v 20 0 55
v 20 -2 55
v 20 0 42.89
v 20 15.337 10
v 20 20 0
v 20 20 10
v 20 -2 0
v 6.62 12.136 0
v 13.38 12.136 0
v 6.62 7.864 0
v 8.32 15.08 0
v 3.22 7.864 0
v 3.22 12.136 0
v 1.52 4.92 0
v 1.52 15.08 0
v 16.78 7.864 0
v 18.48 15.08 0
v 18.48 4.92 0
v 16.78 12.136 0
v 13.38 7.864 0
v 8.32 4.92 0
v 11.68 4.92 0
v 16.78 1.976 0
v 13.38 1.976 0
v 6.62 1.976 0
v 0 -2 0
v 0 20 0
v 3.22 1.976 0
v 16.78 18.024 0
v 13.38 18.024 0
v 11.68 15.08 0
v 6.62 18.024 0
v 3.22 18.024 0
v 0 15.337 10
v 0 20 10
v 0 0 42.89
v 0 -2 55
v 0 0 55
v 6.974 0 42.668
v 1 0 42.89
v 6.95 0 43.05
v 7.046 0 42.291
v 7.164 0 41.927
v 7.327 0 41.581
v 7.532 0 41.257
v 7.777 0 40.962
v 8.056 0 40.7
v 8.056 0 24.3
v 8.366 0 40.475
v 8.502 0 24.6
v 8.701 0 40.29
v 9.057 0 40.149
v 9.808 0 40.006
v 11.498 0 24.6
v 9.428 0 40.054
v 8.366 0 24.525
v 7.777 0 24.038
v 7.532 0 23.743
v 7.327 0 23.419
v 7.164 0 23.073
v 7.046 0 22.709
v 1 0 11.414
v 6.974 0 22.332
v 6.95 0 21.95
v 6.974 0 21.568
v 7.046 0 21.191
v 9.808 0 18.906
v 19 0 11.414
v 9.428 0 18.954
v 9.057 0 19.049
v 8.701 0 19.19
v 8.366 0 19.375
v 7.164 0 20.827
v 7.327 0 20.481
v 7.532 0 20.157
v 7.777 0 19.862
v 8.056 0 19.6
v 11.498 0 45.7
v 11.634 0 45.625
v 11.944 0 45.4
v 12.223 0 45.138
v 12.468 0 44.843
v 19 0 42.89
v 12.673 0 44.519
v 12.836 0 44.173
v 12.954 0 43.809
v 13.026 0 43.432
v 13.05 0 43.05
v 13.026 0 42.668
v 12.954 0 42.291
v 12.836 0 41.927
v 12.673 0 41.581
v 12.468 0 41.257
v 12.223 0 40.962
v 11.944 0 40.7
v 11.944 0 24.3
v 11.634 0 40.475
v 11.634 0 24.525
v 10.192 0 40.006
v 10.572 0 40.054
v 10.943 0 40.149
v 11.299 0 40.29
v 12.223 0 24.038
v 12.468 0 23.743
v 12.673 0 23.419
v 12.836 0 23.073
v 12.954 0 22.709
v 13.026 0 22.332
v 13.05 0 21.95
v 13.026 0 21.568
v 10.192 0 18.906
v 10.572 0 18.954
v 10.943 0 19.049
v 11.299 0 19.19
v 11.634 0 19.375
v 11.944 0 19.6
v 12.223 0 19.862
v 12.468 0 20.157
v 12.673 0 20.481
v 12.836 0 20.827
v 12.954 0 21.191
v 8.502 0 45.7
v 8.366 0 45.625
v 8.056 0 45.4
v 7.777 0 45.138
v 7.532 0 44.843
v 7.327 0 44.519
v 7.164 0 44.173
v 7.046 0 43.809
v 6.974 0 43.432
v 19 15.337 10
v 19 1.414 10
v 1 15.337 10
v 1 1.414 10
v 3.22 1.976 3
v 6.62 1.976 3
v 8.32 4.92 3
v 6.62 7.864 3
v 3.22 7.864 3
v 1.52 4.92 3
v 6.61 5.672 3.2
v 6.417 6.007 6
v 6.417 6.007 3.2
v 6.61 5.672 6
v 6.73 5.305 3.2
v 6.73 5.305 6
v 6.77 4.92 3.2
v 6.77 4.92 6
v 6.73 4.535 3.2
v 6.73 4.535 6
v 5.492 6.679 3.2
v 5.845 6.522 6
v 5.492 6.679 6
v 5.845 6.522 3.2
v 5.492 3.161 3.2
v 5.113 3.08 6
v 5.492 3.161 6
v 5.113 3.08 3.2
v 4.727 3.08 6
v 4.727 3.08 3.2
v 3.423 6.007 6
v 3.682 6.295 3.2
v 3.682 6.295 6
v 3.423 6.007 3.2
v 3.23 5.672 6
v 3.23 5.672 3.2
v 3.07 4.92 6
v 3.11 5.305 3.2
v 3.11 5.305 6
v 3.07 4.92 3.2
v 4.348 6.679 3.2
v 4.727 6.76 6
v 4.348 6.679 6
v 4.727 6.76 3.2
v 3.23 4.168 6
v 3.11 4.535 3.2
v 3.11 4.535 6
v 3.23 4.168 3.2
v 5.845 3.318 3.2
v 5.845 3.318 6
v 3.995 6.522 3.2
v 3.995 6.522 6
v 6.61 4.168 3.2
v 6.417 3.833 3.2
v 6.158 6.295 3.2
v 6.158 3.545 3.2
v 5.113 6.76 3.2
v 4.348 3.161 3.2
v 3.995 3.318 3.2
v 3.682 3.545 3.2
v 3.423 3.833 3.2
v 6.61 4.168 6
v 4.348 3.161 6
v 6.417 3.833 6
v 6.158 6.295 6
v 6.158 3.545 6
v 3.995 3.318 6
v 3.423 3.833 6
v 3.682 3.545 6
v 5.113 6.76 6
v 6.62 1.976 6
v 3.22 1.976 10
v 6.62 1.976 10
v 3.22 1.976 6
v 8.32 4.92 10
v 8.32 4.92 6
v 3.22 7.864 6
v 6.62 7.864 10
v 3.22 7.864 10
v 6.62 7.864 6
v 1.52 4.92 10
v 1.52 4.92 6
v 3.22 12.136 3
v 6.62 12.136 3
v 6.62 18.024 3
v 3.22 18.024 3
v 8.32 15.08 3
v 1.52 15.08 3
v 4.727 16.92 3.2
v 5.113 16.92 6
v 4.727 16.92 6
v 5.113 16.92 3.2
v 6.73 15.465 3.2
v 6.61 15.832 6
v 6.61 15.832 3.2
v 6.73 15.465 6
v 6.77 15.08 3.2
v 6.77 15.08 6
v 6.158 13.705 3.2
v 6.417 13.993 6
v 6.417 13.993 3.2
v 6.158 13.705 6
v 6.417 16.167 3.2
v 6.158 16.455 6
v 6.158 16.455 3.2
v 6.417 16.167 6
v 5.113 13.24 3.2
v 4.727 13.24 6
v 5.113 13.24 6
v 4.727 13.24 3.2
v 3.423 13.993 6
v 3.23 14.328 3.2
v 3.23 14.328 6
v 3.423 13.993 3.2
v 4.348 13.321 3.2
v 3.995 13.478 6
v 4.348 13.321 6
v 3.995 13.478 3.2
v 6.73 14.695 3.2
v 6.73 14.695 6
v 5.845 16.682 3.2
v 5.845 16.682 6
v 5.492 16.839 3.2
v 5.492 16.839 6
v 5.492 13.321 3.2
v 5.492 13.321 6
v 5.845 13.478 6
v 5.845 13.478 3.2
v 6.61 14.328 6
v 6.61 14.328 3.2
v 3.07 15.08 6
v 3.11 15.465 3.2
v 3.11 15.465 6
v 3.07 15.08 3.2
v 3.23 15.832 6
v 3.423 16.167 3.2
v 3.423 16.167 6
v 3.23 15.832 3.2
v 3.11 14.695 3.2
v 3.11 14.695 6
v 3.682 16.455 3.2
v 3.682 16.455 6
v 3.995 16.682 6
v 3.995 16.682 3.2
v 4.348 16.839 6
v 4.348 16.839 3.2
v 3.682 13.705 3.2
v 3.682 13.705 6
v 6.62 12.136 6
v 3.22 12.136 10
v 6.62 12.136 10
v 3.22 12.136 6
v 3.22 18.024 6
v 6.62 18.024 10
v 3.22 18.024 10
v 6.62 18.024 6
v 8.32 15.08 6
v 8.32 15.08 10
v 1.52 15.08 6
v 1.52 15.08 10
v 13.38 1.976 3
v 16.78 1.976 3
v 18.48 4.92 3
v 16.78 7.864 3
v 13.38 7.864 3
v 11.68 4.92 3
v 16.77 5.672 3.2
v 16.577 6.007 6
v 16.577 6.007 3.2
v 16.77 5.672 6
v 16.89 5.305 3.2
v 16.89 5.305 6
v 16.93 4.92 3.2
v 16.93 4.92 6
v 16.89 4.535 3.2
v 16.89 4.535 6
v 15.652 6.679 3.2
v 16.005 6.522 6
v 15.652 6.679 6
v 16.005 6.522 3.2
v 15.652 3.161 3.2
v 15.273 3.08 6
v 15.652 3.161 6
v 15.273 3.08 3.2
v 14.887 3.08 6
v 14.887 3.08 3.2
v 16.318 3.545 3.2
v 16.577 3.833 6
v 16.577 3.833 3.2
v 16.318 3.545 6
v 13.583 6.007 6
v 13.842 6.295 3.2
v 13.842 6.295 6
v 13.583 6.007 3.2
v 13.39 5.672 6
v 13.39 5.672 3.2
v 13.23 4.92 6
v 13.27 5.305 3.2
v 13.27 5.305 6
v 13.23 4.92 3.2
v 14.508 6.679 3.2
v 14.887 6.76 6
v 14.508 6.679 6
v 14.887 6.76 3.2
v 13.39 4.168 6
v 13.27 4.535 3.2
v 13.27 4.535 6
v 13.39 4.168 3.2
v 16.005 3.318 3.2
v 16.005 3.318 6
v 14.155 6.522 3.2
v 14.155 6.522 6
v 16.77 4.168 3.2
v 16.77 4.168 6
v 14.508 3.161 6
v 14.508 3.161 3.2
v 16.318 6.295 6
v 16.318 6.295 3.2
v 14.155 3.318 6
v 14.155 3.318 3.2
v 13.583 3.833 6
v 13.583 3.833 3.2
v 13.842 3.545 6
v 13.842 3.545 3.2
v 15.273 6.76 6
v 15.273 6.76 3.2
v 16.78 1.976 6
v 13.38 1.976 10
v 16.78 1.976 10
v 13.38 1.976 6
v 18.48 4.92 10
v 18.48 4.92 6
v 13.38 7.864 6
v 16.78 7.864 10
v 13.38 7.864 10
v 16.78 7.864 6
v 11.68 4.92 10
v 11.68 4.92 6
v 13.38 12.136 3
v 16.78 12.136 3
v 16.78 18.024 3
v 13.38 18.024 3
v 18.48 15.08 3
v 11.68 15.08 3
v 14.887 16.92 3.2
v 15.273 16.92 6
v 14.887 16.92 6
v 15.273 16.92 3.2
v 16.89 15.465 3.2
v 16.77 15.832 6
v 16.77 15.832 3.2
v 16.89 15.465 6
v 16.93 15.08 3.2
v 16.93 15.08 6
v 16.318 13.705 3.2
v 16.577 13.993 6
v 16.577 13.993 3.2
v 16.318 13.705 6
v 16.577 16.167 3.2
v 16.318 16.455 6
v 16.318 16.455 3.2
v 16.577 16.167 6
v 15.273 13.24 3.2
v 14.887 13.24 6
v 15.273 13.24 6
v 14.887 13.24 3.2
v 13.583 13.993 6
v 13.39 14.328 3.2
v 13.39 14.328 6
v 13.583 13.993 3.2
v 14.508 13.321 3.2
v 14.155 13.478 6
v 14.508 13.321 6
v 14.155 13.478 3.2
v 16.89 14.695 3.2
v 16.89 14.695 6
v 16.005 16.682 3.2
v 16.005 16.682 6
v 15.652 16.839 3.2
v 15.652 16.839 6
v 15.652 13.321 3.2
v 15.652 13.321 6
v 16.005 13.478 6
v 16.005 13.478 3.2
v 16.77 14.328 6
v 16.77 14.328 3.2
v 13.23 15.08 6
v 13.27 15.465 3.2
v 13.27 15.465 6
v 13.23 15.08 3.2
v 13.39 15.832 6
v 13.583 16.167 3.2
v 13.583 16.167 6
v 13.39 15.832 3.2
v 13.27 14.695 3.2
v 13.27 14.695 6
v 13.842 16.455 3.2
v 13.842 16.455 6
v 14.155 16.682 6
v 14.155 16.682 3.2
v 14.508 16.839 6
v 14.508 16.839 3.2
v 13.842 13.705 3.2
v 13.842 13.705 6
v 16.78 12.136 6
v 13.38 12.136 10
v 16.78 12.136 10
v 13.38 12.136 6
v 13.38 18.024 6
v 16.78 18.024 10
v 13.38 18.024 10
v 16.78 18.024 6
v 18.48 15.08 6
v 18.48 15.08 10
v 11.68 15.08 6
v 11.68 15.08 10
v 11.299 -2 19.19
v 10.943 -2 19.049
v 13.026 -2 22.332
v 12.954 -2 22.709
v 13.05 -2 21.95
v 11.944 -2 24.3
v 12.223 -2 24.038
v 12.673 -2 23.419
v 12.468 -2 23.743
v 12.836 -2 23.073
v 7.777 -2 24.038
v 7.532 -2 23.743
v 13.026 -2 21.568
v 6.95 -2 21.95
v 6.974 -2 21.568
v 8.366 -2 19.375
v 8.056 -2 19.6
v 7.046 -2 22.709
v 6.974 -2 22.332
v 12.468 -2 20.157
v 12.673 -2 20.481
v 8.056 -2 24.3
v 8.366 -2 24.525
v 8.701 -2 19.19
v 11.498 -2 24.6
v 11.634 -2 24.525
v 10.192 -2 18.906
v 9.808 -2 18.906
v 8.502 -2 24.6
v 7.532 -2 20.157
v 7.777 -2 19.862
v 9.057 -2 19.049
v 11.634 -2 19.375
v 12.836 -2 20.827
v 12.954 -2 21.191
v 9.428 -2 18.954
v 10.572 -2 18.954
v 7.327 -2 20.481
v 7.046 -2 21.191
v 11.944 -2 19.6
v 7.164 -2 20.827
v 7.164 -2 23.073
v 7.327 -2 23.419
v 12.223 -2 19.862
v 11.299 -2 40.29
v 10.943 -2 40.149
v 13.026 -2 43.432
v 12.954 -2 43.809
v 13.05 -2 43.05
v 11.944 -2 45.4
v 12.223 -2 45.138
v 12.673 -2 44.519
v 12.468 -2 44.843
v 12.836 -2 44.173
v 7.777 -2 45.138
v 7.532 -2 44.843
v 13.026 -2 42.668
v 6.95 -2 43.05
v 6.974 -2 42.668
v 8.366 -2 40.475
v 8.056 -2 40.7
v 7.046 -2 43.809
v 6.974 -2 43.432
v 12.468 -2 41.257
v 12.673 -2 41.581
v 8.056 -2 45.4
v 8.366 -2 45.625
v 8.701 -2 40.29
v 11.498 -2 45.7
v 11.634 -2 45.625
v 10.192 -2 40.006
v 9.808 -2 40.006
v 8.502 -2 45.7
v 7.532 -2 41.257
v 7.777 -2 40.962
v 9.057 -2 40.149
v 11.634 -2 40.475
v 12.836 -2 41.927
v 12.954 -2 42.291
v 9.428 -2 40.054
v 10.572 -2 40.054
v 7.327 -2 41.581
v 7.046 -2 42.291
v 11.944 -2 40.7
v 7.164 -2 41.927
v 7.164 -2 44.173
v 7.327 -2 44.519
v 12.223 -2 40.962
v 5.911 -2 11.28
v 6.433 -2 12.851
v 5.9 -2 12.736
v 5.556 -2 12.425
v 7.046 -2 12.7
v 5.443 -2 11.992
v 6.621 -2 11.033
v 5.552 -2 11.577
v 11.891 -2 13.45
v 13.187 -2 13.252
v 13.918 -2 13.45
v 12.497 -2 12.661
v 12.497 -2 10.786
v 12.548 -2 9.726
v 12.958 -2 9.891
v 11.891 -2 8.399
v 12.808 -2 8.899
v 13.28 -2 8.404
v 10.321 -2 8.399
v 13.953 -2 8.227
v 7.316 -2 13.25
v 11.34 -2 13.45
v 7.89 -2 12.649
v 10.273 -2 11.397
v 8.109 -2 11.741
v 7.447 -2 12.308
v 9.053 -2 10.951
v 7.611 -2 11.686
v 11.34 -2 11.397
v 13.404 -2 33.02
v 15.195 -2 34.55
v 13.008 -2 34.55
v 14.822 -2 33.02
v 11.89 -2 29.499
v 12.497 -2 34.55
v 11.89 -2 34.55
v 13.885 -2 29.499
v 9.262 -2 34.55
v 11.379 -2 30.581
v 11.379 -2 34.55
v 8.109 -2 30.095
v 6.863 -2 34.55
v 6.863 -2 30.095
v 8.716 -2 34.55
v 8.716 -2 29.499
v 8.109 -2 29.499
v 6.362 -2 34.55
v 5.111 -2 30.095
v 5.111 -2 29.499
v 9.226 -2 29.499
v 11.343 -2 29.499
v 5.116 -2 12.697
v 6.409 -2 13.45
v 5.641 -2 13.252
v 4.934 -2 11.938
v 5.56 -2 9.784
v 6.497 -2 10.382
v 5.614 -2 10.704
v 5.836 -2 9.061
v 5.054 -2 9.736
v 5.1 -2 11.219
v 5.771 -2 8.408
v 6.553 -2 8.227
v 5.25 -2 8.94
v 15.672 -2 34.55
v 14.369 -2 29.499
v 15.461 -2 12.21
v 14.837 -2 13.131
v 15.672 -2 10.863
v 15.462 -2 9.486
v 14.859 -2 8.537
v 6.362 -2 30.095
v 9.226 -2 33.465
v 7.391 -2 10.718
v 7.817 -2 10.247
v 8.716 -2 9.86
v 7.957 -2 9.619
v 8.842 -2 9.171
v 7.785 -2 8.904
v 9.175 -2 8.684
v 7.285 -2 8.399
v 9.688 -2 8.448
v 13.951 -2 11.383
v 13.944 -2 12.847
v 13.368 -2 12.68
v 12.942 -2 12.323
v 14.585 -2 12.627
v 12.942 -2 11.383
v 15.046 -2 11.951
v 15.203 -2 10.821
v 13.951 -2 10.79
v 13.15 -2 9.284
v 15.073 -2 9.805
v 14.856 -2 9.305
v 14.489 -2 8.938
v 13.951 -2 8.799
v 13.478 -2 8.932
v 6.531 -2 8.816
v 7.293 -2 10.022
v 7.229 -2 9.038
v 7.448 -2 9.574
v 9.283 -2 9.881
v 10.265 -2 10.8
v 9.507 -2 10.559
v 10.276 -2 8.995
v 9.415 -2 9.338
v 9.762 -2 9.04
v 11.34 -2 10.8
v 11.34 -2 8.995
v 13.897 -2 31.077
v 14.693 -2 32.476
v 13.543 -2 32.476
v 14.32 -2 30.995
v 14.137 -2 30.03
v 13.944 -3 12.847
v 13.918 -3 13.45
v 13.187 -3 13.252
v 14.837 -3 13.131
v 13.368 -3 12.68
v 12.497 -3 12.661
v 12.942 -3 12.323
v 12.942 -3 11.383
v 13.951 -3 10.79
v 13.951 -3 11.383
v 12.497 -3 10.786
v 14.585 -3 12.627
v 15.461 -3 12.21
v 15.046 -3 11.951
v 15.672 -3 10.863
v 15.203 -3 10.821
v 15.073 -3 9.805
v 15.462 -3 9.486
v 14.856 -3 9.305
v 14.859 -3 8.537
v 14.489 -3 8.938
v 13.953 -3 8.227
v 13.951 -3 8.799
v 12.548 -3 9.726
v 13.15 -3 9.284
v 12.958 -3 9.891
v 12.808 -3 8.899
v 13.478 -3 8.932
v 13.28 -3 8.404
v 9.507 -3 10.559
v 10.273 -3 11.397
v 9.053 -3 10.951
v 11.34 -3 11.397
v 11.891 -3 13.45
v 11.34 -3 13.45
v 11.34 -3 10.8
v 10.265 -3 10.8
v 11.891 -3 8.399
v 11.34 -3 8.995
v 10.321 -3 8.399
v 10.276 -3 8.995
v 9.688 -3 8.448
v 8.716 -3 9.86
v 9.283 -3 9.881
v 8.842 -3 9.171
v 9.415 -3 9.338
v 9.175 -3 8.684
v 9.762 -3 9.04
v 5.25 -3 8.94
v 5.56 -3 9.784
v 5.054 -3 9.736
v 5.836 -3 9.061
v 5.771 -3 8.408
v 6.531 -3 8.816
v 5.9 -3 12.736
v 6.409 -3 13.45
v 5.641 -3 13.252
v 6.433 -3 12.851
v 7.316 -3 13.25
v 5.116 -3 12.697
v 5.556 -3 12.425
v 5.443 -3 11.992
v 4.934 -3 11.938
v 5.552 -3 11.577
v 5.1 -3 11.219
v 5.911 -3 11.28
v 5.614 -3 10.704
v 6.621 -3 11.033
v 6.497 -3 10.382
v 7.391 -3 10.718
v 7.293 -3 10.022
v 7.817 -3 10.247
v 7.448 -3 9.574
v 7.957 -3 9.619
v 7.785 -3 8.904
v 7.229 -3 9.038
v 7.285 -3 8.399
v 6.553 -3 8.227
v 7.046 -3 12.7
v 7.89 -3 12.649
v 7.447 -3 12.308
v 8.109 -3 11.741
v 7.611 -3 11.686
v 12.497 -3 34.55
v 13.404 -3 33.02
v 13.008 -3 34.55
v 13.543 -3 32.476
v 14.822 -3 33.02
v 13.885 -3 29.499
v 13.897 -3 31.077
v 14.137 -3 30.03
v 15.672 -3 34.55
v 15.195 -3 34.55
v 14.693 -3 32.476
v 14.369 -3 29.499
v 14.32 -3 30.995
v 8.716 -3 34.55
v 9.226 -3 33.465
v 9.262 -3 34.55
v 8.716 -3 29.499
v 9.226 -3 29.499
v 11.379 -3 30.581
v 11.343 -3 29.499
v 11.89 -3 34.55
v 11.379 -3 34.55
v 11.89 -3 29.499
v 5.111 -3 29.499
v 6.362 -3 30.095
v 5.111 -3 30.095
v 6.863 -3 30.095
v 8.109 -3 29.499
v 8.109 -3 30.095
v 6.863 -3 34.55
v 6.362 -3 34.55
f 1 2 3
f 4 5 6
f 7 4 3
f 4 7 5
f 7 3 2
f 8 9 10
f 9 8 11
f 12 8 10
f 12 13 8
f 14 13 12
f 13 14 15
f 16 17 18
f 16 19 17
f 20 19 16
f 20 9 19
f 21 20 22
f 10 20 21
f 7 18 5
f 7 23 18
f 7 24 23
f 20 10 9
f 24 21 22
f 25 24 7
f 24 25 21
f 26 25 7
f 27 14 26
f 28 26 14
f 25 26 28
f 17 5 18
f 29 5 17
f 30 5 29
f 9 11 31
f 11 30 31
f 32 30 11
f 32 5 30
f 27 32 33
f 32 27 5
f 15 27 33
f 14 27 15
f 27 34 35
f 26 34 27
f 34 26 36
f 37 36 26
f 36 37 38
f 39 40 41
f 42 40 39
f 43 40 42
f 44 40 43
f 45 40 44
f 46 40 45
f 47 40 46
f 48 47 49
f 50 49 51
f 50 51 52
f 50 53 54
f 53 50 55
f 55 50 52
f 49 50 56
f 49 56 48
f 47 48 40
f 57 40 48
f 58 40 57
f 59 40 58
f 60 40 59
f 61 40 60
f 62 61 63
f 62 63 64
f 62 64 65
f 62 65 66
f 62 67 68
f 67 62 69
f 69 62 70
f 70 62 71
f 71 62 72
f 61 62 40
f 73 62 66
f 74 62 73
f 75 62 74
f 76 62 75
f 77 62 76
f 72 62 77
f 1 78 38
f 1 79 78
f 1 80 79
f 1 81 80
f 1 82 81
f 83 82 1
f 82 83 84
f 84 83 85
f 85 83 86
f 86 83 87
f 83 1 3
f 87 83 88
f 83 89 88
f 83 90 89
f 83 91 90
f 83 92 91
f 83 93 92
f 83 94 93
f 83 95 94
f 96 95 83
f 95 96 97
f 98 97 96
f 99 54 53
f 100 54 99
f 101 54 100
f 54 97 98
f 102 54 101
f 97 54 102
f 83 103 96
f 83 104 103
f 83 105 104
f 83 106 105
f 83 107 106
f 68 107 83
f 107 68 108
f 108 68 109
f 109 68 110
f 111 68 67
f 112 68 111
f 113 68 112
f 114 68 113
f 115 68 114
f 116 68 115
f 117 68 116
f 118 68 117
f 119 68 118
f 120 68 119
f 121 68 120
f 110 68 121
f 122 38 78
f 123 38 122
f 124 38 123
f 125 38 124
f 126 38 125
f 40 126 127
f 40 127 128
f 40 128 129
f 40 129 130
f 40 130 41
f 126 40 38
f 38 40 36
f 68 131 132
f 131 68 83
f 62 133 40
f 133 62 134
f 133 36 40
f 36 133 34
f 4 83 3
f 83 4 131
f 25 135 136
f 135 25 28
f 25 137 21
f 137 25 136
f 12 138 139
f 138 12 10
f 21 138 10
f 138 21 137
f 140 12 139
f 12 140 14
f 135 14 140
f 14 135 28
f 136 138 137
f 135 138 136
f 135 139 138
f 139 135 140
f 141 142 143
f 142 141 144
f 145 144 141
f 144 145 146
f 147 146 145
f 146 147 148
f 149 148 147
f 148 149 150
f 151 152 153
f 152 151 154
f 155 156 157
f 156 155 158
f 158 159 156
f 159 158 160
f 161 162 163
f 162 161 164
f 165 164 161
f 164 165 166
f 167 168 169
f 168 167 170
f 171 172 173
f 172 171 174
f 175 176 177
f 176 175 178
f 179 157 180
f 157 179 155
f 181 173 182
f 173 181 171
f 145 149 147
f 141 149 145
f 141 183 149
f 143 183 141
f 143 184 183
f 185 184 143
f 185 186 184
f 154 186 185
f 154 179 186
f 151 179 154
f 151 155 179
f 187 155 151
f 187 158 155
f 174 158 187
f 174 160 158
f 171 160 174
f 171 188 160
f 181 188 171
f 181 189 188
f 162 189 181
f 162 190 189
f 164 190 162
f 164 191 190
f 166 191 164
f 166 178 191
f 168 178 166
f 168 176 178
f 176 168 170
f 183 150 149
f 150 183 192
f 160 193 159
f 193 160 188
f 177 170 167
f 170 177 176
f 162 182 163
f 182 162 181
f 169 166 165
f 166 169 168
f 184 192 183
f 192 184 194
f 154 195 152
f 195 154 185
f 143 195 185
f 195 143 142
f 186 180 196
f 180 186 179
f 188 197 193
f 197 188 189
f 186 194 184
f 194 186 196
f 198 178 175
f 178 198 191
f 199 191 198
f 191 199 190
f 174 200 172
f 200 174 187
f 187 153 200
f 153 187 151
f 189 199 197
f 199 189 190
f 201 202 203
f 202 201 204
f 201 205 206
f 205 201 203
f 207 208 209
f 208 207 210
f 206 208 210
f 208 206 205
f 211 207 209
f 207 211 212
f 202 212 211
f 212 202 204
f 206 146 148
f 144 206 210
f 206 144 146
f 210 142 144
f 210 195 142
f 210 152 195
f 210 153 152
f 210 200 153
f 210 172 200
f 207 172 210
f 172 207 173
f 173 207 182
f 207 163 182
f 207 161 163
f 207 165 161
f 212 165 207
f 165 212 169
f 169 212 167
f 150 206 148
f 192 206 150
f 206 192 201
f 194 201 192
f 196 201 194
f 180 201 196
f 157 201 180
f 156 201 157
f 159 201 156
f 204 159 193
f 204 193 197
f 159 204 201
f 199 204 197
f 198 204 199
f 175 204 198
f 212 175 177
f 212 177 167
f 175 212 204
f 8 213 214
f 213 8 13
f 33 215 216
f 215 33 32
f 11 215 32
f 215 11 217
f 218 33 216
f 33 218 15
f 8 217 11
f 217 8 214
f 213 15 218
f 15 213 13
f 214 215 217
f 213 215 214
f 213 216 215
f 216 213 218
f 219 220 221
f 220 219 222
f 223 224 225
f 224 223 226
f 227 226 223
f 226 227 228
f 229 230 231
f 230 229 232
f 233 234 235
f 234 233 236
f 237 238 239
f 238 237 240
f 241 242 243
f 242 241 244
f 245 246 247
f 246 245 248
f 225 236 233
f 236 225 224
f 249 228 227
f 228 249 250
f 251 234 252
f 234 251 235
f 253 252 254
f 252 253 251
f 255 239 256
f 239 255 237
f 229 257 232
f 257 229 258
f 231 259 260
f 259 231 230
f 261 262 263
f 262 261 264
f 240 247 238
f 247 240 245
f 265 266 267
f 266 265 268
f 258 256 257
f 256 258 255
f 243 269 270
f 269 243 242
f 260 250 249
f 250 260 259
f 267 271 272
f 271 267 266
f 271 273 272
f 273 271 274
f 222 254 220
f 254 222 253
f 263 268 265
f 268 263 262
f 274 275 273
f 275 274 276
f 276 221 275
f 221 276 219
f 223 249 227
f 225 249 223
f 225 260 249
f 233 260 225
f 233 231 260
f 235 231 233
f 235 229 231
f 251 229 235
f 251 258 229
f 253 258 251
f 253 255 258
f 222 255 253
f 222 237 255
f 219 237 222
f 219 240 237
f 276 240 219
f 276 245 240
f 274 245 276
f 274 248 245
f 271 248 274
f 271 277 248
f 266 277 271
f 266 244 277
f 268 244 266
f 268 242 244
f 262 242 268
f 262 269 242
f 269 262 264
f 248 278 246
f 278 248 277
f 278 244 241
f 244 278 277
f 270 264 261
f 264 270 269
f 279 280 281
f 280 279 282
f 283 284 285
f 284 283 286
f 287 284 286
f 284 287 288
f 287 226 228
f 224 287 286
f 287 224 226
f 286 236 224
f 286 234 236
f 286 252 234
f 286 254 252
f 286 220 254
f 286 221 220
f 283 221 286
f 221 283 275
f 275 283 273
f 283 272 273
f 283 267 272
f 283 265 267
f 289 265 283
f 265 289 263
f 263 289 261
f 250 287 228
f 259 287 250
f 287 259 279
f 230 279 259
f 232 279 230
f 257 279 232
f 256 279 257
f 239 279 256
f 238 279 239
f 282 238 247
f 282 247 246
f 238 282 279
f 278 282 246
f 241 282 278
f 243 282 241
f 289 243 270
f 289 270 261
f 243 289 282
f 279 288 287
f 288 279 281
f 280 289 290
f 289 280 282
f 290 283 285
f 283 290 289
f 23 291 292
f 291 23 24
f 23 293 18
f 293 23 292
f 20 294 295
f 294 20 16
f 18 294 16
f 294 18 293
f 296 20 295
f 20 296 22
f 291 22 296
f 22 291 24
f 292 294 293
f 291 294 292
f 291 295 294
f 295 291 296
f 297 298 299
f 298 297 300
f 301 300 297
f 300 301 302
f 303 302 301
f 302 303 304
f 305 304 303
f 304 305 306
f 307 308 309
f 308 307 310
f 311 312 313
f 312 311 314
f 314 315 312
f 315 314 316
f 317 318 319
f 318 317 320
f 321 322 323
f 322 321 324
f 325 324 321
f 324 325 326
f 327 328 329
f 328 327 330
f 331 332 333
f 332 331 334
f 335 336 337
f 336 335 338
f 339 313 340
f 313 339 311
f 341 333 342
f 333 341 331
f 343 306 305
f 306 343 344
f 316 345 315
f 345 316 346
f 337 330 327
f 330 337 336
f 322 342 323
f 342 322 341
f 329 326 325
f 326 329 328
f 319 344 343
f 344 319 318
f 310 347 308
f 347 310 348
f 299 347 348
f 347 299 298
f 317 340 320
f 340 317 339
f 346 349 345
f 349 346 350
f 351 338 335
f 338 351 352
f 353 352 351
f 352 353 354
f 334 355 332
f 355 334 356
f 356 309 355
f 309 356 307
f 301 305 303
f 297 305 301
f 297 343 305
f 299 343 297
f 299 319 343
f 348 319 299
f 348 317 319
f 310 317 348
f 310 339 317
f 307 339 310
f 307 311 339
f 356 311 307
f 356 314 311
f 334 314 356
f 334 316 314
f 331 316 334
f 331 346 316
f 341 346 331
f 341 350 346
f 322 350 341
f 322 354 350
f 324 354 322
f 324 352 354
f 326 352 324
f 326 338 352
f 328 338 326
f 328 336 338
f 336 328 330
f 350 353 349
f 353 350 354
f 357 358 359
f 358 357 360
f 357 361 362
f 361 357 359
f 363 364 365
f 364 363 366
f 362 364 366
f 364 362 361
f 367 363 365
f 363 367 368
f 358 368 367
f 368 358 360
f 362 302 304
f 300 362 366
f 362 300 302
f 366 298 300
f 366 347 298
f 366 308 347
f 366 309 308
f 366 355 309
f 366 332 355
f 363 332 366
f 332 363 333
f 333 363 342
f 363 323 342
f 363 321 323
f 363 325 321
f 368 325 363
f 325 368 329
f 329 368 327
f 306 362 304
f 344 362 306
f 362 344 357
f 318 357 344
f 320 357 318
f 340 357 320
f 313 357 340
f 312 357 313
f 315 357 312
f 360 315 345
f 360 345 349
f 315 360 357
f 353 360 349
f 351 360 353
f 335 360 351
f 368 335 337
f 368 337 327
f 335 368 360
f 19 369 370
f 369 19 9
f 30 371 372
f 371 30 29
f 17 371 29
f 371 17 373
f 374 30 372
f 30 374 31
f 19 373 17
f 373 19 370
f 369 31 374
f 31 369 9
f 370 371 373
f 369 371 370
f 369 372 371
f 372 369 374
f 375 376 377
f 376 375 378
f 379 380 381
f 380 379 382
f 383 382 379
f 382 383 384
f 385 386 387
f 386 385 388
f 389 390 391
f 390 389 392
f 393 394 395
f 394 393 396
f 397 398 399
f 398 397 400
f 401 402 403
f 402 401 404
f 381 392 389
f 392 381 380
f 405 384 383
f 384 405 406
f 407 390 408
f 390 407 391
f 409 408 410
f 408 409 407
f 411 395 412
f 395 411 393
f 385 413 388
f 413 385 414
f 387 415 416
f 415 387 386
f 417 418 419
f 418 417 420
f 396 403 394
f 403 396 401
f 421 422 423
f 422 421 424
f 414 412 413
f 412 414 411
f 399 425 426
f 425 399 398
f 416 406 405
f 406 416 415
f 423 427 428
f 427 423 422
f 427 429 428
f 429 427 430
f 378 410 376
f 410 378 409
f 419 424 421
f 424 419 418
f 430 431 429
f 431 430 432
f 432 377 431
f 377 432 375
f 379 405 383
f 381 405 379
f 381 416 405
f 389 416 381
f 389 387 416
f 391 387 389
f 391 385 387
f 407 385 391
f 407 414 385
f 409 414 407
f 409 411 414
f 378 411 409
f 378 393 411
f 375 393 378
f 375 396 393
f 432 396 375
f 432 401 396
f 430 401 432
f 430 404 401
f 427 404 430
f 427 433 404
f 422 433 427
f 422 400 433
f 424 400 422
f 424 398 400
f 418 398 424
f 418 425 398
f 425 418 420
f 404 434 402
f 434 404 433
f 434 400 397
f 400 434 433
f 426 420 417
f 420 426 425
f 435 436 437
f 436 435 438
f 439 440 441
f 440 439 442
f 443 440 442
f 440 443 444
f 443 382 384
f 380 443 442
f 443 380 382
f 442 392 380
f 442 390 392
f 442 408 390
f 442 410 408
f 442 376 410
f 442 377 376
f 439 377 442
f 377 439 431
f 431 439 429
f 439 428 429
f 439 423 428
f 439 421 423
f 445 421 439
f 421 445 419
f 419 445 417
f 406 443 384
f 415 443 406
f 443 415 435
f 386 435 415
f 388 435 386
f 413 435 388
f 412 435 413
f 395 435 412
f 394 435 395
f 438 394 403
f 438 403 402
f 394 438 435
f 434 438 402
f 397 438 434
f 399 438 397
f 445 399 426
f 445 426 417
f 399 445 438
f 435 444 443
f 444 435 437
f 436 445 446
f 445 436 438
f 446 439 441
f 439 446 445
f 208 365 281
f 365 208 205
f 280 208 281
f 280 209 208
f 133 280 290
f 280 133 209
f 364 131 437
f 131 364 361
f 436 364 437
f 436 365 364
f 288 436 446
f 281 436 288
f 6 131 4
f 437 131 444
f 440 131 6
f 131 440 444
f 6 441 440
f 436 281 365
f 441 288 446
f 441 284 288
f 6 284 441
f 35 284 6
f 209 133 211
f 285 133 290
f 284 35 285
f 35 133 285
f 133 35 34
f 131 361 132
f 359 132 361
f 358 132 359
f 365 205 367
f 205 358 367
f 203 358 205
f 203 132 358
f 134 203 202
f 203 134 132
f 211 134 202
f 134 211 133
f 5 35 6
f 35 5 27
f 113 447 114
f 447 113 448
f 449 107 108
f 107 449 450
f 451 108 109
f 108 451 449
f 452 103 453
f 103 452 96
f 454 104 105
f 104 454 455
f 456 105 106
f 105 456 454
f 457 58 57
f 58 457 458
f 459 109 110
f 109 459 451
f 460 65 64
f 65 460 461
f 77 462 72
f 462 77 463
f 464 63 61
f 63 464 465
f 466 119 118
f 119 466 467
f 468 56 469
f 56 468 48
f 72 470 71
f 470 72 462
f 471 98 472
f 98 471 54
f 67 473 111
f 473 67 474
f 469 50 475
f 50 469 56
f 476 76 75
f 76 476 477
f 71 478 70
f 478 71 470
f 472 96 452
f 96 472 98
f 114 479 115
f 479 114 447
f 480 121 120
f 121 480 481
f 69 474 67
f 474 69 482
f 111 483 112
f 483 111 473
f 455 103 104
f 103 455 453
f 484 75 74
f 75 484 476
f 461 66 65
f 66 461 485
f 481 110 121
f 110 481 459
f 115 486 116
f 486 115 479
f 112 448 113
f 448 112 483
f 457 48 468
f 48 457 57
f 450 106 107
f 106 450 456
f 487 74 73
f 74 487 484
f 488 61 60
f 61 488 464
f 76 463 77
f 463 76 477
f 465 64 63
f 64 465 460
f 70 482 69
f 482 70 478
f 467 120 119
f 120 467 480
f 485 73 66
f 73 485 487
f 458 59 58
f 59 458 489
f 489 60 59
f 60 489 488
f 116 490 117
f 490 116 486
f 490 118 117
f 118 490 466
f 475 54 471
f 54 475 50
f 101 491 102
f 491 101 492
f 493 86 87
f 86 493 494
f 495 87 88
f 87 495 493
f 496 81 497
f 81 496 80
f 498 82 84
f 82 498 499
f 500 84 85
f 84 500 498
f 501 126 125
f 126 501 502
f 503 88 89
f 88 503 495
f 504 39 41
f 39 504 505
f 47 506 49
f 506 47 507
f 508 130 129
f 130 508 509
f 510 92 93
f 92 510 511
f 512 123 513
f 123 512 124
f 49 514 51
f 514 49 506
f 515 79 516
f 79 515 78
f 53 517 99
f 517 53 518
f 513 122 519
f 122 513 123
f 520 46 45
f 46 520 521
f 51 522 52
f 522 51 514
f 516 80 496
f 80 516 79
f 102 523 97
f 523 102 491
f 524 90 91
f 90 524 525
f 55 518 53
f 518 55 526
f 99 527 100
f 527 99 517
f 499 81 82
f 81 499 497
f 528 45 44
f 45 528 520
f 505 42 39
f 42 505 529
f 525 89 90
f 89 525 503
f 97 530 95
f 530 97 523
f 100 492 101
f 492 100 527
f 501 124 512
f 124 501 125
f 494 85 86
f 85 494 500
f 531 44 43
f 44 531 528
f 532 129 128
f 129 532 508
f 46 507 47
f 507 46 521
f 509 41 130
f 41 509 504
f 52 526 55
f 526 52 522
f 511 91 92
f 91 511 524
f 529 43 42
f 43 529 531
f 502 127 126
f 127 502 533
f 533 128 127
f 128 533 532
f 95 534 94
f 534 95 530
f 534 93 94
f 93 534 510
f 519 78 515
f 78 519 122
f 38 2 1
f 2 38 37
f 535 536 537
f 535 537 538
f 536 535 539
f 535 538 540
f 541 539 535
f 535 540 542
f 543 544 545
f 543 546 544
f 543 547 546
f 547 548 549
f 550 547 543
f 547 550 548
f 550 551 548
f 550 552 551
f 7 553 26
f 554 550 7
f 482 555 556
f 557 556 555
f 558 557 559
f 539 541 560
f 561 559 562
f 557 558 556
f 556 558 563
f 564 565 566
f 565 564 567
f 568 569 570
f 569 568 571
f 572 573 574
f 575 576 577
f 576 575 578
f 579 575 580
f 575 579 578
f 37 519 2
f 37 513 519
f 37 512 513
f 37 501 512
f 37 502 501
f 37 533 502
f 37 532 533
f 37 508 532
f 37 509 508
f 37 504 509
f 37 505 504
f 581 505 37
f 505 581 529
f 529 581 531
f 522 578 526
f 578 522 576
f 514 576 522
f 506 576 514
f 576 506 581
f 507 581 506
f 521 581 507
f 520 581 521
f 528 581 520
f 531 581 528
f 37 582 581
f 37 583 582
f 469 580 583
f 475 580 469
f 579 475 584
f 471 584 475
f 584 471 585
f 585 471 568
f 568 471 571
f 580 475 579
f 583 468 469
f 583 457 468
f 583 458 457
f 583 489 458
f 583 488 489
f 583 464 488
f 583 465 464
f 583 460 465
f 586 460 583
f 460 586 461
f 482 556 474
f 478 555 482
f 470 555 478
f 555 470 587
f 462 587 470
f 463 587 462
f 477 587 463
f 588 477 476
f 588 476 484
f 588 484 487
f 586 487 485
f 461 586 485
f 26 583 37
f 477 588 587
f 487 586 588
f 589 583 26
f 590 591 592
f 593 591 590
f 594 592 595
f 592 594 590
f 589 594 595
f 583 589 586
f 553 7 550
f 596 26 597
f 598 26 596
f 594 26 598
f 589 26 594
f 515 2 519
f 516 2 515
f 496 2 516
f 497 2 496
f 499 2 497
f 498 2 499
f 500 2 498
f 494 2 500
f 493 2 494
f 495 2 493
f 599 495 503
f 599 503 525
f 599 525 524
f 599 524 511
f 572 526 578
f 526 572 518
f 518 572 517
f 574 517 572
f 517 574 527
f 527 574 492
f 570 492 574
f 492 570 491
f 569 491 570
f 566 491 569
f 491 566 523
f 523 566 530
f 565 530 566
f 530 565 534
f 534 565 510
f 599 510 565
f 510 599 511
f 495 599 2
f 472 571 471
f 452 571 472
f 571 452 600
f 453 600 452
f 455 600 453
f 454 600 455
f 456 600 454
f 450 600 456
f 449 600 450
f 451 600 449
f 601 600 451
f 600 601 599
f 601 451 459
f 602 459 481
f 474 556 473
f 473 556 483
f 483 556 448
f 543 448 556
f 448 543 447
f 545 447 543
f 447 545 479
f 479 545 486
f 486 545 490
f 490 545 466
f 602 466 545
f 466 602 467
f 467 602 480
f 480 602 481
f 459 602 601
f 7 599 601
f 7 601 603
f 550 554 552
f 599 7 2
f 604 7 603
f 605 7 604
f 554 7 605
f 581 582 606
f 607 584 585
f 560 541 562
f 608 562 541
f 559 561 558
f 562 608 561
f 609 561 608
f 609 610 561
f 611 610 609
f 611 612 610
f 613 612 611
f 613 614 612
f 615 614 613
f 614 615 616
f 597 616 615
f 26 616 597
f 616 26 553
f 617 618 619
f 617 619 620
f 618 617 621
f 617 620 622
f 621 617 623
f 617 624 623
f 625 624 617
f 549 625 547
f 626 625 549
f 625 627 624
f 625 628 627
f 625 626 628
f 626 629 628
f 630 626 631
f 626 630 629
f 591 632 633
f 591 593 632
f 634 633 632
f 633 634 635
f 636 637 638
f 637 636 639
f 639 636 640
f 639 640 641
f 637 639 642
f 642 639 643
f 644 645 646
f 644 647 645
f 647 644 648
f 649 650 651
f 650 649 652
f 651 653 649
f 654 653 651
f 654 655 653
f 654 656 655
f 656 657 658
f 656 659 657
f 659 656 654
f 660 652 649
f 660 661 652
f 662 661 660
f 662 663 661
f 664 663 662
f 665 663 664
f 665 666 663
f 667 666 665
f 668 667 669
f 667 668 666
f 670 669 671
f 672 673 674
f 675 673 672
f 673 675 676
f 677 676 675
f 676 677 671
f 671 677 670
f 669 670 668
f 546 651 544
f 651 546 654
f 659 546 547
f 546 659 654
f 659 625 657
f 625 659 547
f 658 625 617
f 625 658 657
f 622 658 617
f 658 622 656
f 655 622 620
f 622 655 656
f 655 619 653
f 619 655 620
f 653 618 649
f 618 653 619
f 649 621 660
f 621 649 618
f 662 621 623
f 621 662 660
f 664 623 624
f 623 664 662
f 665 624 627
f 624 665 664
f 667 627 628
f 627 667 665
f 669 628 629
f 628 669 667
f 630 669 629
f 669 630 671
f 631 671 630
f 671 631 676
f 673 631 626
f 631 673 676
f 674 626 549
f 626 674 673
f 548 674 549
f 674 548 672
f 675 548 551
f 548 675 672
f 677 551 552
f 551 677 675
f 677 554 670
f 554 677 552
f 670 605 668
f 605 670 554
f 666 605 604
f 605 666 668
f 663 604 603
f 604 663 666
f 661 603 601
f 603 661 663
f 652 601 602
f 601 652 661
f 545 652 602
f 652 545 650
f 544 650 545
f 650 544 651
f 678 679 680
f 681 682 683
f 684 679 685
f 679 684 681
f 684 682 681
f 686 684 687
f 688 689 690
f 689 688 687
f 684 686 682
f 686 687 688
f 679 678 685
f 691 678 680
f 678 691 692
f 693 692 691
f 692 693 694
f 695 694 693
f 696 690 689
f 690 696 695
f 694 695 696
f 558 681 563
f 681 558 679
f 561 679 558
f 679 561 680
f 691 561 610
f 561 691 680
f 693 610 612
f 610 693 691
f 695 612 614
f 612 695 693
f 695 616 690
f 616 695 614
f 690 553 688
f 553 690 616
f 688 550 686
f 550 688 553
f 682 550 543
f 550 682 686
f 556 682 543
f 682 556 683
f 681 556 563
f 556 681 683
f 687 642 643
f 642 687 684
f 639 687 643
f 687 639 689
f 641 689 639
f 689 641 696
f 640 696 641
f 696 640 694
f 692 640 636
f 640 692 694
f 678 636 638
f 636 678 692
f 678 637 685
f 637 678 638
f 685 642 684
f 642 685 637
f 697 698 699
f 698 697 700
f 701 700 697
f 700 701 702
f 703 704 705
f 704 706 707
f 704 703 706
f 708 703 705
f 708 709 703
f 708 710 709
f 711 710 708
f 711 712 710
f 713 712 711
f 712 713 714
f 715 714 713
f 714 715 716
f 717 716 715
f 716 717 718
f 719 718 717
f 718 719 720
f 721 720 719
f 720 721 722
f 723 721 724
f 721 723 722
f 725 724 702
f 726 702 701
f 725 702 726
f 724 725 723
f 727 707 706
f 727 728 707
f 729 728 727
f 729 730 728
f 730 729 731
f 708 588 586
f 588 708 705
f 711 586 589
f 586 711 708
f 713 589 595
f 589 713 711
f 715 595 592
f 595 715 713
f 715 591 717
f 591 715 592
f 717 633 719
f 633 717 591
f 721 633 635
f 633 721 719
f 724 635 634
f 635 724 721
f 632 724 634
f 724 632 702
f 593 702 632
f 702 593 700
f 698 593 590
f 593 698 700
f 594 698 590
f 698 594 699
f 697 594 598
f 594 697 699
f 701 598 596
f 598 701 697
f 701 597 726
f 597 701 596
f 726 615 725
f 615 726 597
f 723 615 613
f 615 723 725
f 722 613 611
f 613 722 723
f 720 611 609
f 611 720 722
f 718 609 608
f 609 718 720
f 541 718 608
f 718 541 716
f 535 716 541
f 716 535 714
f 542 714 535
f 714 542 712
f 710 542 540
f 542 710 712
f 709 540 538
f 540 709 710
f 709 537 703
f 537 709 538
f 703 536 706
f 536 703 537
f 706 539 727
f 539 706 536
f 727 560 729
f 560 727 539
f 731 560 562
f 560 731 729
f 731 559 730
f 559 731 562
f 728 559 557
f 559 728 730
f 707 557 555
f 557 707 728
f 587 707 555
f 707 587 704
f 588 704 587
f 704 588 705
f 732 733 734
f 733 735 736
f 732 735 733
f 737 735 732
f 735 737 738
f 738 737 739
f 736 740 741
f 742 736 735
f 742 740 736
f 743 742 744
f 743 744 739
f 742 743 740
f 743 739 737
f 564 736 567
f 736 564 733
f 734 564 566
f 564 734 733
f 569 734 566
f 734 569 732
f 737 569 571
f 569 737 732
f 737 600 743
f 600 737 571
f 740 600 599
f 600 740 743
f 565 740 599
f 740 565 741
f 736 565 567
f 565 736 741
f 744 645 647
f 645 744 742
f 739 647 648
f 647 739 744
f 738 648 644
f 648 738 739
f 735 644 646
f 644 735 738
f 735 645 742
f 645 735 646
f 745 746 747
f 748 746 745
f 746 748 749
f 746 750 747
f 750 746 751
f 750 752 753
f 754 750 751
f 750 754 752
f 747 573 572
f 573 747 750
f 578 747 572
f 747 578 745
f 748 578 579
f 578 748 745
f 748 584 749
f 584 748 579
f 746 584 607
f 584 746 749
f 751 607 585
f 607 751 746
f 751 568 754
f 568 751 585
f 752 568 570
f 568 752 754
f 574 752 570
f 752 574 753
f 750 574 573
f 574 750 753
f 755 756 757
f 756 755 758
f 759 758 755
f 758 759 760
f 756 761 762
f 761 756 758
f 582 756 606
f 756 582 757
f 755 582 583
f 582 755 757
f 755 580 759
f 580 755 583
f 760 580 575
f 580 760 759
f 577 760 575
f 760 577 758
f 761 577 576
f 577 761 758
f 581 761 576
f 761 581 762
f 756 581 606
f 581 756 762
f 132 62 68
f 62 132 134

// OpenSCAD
use<Write.scad>
$fn=100;

x_size = 20;           // horizontal outer size of the pedestal. 
y_size = 20;           // 
mount_hole = 3.5;
nut_size = 6.8;
SMA_dia = 6.1;
SMA_flat = 3.15;
thickness = 10;         //
wall_thickness = 2;
height = 55;

mount_hole = 3.7;
clear = 0.175;

MLAB_grid = 10.16;

x_holes = floor(x_size / MLAB_grid);
y_holes = floor(y_size / MLAB_grid);

MLAB_grid_xoffset = (x_size - (x_holes * MLAB_grid))/2;
MLAB_grid_yoffset = (y_size - (y_holes * MLAB_grid))/2;

//Top part

union () {

    difference(){
        cube([x_size, y_size, height]);
        translate([1, 0, 0]) cube([x_size-2, y_size+0.1, height+0.1]);
        translate([-0.1, y_size, 0]) rotate([25, 0, 0]) cube([x_size+0.2, y_size+10, height+10]);
    }

    difference () {
                cube([x_size, y_size , thickness ]);

// MLAB grid holes
        grid_list = [for (j = [MLAB_grid_xoffset : MLAB_grid: x_size], i = [MLAB_grid_yoffset :MLAB_grid: y_size])  [j, i] ];
            
        for (j = grid_list) {
                translate (concat(j, [0]))
                    cylinder (h = 3, r= nut_size/2, $fn=6);
                translate (concat(j, [3.2]))  // one solid layer for slicer (the holes will be pierced on demand )
                    cylinder (h = thickness /3, r= mount_hole/2, $fn=30);
                translate (concat(j, [6.0]))
                    cylinder (h = 10, r= nut_size/2, $fn=6);
        }  
    };
// vertical to horizontal brick connection
    translate ([ 0, 0, thickness - sqrt(2 * wall_thickness*wall_thickness) / 2])  // move to correct positon on square diagonal  
        rotate([45,0,0])
            cube([x_size, wall_thickness , wall_thickness ]);

    difference  () {

        translate ([0, -wall_thickness, 0])    // vertical brick
            cube([y_size, wall_thickness , height ]);
        
// SMA connector holes
        translate ([ x_size/2, wall_thickness/2, (height - thickness)/3  + thickness - SMA_dia/2])    
            rotate([90,0,0]) {
                difference  () {
                    cylinder (h = 2*wall_thickness, r= SMA_dia/2, $fn=50);
                        translate([ 0, SMA_flat , wall_thickness/2 + wall_thickness ]) 
                            cube([SMA_dia, 1 , thickness ], center=true);
                }
            }

        translate ([ x_size/2, wall_thickness/2, 2*(height - thickness)/3  + thickness  + SMA_dia/2 ])    
            rotate([90,0,0]){
                difference  () {
                    cylinder (h = 2*wall_thickness, r= SMA_dia/2, $fn=50);
                        translate([ 0, SMA_flat , wall_thickness/2 + wall_thickness ]) 
                            cube([SMA_dia, 1 , thickness ], center=true);
                }
 
           }
           
    }
// texts
    
        translate ([ x_size/2, wall_thickness/2, (height - thickness)/3  + thickness - SMA_dia/2])    
            rotate([90,0,0]) {
                translate([ 0, -11, wall_thickness/2 + wall_thickness ]) 
                    rotate([0,0,180])
                        write("GPS",h=5,t=2,space= 1.1, font = "Letters.dxf", center=true);
            }
            
            translate ([ x_size/2, wall_thickness/2, 2*(height - thickness)/3  + thickness  + SMA_dia/2 ])    
            rotate([90,0,0]){
                translate([ 0, -11, wall_thickness/2 + wall_thickness]) 
                    rotate([0,0,180])
                        write("ANT",h=5,t=2, space= 1.1, font = "Letters.dxf",center=true);
            }
               
           
}
